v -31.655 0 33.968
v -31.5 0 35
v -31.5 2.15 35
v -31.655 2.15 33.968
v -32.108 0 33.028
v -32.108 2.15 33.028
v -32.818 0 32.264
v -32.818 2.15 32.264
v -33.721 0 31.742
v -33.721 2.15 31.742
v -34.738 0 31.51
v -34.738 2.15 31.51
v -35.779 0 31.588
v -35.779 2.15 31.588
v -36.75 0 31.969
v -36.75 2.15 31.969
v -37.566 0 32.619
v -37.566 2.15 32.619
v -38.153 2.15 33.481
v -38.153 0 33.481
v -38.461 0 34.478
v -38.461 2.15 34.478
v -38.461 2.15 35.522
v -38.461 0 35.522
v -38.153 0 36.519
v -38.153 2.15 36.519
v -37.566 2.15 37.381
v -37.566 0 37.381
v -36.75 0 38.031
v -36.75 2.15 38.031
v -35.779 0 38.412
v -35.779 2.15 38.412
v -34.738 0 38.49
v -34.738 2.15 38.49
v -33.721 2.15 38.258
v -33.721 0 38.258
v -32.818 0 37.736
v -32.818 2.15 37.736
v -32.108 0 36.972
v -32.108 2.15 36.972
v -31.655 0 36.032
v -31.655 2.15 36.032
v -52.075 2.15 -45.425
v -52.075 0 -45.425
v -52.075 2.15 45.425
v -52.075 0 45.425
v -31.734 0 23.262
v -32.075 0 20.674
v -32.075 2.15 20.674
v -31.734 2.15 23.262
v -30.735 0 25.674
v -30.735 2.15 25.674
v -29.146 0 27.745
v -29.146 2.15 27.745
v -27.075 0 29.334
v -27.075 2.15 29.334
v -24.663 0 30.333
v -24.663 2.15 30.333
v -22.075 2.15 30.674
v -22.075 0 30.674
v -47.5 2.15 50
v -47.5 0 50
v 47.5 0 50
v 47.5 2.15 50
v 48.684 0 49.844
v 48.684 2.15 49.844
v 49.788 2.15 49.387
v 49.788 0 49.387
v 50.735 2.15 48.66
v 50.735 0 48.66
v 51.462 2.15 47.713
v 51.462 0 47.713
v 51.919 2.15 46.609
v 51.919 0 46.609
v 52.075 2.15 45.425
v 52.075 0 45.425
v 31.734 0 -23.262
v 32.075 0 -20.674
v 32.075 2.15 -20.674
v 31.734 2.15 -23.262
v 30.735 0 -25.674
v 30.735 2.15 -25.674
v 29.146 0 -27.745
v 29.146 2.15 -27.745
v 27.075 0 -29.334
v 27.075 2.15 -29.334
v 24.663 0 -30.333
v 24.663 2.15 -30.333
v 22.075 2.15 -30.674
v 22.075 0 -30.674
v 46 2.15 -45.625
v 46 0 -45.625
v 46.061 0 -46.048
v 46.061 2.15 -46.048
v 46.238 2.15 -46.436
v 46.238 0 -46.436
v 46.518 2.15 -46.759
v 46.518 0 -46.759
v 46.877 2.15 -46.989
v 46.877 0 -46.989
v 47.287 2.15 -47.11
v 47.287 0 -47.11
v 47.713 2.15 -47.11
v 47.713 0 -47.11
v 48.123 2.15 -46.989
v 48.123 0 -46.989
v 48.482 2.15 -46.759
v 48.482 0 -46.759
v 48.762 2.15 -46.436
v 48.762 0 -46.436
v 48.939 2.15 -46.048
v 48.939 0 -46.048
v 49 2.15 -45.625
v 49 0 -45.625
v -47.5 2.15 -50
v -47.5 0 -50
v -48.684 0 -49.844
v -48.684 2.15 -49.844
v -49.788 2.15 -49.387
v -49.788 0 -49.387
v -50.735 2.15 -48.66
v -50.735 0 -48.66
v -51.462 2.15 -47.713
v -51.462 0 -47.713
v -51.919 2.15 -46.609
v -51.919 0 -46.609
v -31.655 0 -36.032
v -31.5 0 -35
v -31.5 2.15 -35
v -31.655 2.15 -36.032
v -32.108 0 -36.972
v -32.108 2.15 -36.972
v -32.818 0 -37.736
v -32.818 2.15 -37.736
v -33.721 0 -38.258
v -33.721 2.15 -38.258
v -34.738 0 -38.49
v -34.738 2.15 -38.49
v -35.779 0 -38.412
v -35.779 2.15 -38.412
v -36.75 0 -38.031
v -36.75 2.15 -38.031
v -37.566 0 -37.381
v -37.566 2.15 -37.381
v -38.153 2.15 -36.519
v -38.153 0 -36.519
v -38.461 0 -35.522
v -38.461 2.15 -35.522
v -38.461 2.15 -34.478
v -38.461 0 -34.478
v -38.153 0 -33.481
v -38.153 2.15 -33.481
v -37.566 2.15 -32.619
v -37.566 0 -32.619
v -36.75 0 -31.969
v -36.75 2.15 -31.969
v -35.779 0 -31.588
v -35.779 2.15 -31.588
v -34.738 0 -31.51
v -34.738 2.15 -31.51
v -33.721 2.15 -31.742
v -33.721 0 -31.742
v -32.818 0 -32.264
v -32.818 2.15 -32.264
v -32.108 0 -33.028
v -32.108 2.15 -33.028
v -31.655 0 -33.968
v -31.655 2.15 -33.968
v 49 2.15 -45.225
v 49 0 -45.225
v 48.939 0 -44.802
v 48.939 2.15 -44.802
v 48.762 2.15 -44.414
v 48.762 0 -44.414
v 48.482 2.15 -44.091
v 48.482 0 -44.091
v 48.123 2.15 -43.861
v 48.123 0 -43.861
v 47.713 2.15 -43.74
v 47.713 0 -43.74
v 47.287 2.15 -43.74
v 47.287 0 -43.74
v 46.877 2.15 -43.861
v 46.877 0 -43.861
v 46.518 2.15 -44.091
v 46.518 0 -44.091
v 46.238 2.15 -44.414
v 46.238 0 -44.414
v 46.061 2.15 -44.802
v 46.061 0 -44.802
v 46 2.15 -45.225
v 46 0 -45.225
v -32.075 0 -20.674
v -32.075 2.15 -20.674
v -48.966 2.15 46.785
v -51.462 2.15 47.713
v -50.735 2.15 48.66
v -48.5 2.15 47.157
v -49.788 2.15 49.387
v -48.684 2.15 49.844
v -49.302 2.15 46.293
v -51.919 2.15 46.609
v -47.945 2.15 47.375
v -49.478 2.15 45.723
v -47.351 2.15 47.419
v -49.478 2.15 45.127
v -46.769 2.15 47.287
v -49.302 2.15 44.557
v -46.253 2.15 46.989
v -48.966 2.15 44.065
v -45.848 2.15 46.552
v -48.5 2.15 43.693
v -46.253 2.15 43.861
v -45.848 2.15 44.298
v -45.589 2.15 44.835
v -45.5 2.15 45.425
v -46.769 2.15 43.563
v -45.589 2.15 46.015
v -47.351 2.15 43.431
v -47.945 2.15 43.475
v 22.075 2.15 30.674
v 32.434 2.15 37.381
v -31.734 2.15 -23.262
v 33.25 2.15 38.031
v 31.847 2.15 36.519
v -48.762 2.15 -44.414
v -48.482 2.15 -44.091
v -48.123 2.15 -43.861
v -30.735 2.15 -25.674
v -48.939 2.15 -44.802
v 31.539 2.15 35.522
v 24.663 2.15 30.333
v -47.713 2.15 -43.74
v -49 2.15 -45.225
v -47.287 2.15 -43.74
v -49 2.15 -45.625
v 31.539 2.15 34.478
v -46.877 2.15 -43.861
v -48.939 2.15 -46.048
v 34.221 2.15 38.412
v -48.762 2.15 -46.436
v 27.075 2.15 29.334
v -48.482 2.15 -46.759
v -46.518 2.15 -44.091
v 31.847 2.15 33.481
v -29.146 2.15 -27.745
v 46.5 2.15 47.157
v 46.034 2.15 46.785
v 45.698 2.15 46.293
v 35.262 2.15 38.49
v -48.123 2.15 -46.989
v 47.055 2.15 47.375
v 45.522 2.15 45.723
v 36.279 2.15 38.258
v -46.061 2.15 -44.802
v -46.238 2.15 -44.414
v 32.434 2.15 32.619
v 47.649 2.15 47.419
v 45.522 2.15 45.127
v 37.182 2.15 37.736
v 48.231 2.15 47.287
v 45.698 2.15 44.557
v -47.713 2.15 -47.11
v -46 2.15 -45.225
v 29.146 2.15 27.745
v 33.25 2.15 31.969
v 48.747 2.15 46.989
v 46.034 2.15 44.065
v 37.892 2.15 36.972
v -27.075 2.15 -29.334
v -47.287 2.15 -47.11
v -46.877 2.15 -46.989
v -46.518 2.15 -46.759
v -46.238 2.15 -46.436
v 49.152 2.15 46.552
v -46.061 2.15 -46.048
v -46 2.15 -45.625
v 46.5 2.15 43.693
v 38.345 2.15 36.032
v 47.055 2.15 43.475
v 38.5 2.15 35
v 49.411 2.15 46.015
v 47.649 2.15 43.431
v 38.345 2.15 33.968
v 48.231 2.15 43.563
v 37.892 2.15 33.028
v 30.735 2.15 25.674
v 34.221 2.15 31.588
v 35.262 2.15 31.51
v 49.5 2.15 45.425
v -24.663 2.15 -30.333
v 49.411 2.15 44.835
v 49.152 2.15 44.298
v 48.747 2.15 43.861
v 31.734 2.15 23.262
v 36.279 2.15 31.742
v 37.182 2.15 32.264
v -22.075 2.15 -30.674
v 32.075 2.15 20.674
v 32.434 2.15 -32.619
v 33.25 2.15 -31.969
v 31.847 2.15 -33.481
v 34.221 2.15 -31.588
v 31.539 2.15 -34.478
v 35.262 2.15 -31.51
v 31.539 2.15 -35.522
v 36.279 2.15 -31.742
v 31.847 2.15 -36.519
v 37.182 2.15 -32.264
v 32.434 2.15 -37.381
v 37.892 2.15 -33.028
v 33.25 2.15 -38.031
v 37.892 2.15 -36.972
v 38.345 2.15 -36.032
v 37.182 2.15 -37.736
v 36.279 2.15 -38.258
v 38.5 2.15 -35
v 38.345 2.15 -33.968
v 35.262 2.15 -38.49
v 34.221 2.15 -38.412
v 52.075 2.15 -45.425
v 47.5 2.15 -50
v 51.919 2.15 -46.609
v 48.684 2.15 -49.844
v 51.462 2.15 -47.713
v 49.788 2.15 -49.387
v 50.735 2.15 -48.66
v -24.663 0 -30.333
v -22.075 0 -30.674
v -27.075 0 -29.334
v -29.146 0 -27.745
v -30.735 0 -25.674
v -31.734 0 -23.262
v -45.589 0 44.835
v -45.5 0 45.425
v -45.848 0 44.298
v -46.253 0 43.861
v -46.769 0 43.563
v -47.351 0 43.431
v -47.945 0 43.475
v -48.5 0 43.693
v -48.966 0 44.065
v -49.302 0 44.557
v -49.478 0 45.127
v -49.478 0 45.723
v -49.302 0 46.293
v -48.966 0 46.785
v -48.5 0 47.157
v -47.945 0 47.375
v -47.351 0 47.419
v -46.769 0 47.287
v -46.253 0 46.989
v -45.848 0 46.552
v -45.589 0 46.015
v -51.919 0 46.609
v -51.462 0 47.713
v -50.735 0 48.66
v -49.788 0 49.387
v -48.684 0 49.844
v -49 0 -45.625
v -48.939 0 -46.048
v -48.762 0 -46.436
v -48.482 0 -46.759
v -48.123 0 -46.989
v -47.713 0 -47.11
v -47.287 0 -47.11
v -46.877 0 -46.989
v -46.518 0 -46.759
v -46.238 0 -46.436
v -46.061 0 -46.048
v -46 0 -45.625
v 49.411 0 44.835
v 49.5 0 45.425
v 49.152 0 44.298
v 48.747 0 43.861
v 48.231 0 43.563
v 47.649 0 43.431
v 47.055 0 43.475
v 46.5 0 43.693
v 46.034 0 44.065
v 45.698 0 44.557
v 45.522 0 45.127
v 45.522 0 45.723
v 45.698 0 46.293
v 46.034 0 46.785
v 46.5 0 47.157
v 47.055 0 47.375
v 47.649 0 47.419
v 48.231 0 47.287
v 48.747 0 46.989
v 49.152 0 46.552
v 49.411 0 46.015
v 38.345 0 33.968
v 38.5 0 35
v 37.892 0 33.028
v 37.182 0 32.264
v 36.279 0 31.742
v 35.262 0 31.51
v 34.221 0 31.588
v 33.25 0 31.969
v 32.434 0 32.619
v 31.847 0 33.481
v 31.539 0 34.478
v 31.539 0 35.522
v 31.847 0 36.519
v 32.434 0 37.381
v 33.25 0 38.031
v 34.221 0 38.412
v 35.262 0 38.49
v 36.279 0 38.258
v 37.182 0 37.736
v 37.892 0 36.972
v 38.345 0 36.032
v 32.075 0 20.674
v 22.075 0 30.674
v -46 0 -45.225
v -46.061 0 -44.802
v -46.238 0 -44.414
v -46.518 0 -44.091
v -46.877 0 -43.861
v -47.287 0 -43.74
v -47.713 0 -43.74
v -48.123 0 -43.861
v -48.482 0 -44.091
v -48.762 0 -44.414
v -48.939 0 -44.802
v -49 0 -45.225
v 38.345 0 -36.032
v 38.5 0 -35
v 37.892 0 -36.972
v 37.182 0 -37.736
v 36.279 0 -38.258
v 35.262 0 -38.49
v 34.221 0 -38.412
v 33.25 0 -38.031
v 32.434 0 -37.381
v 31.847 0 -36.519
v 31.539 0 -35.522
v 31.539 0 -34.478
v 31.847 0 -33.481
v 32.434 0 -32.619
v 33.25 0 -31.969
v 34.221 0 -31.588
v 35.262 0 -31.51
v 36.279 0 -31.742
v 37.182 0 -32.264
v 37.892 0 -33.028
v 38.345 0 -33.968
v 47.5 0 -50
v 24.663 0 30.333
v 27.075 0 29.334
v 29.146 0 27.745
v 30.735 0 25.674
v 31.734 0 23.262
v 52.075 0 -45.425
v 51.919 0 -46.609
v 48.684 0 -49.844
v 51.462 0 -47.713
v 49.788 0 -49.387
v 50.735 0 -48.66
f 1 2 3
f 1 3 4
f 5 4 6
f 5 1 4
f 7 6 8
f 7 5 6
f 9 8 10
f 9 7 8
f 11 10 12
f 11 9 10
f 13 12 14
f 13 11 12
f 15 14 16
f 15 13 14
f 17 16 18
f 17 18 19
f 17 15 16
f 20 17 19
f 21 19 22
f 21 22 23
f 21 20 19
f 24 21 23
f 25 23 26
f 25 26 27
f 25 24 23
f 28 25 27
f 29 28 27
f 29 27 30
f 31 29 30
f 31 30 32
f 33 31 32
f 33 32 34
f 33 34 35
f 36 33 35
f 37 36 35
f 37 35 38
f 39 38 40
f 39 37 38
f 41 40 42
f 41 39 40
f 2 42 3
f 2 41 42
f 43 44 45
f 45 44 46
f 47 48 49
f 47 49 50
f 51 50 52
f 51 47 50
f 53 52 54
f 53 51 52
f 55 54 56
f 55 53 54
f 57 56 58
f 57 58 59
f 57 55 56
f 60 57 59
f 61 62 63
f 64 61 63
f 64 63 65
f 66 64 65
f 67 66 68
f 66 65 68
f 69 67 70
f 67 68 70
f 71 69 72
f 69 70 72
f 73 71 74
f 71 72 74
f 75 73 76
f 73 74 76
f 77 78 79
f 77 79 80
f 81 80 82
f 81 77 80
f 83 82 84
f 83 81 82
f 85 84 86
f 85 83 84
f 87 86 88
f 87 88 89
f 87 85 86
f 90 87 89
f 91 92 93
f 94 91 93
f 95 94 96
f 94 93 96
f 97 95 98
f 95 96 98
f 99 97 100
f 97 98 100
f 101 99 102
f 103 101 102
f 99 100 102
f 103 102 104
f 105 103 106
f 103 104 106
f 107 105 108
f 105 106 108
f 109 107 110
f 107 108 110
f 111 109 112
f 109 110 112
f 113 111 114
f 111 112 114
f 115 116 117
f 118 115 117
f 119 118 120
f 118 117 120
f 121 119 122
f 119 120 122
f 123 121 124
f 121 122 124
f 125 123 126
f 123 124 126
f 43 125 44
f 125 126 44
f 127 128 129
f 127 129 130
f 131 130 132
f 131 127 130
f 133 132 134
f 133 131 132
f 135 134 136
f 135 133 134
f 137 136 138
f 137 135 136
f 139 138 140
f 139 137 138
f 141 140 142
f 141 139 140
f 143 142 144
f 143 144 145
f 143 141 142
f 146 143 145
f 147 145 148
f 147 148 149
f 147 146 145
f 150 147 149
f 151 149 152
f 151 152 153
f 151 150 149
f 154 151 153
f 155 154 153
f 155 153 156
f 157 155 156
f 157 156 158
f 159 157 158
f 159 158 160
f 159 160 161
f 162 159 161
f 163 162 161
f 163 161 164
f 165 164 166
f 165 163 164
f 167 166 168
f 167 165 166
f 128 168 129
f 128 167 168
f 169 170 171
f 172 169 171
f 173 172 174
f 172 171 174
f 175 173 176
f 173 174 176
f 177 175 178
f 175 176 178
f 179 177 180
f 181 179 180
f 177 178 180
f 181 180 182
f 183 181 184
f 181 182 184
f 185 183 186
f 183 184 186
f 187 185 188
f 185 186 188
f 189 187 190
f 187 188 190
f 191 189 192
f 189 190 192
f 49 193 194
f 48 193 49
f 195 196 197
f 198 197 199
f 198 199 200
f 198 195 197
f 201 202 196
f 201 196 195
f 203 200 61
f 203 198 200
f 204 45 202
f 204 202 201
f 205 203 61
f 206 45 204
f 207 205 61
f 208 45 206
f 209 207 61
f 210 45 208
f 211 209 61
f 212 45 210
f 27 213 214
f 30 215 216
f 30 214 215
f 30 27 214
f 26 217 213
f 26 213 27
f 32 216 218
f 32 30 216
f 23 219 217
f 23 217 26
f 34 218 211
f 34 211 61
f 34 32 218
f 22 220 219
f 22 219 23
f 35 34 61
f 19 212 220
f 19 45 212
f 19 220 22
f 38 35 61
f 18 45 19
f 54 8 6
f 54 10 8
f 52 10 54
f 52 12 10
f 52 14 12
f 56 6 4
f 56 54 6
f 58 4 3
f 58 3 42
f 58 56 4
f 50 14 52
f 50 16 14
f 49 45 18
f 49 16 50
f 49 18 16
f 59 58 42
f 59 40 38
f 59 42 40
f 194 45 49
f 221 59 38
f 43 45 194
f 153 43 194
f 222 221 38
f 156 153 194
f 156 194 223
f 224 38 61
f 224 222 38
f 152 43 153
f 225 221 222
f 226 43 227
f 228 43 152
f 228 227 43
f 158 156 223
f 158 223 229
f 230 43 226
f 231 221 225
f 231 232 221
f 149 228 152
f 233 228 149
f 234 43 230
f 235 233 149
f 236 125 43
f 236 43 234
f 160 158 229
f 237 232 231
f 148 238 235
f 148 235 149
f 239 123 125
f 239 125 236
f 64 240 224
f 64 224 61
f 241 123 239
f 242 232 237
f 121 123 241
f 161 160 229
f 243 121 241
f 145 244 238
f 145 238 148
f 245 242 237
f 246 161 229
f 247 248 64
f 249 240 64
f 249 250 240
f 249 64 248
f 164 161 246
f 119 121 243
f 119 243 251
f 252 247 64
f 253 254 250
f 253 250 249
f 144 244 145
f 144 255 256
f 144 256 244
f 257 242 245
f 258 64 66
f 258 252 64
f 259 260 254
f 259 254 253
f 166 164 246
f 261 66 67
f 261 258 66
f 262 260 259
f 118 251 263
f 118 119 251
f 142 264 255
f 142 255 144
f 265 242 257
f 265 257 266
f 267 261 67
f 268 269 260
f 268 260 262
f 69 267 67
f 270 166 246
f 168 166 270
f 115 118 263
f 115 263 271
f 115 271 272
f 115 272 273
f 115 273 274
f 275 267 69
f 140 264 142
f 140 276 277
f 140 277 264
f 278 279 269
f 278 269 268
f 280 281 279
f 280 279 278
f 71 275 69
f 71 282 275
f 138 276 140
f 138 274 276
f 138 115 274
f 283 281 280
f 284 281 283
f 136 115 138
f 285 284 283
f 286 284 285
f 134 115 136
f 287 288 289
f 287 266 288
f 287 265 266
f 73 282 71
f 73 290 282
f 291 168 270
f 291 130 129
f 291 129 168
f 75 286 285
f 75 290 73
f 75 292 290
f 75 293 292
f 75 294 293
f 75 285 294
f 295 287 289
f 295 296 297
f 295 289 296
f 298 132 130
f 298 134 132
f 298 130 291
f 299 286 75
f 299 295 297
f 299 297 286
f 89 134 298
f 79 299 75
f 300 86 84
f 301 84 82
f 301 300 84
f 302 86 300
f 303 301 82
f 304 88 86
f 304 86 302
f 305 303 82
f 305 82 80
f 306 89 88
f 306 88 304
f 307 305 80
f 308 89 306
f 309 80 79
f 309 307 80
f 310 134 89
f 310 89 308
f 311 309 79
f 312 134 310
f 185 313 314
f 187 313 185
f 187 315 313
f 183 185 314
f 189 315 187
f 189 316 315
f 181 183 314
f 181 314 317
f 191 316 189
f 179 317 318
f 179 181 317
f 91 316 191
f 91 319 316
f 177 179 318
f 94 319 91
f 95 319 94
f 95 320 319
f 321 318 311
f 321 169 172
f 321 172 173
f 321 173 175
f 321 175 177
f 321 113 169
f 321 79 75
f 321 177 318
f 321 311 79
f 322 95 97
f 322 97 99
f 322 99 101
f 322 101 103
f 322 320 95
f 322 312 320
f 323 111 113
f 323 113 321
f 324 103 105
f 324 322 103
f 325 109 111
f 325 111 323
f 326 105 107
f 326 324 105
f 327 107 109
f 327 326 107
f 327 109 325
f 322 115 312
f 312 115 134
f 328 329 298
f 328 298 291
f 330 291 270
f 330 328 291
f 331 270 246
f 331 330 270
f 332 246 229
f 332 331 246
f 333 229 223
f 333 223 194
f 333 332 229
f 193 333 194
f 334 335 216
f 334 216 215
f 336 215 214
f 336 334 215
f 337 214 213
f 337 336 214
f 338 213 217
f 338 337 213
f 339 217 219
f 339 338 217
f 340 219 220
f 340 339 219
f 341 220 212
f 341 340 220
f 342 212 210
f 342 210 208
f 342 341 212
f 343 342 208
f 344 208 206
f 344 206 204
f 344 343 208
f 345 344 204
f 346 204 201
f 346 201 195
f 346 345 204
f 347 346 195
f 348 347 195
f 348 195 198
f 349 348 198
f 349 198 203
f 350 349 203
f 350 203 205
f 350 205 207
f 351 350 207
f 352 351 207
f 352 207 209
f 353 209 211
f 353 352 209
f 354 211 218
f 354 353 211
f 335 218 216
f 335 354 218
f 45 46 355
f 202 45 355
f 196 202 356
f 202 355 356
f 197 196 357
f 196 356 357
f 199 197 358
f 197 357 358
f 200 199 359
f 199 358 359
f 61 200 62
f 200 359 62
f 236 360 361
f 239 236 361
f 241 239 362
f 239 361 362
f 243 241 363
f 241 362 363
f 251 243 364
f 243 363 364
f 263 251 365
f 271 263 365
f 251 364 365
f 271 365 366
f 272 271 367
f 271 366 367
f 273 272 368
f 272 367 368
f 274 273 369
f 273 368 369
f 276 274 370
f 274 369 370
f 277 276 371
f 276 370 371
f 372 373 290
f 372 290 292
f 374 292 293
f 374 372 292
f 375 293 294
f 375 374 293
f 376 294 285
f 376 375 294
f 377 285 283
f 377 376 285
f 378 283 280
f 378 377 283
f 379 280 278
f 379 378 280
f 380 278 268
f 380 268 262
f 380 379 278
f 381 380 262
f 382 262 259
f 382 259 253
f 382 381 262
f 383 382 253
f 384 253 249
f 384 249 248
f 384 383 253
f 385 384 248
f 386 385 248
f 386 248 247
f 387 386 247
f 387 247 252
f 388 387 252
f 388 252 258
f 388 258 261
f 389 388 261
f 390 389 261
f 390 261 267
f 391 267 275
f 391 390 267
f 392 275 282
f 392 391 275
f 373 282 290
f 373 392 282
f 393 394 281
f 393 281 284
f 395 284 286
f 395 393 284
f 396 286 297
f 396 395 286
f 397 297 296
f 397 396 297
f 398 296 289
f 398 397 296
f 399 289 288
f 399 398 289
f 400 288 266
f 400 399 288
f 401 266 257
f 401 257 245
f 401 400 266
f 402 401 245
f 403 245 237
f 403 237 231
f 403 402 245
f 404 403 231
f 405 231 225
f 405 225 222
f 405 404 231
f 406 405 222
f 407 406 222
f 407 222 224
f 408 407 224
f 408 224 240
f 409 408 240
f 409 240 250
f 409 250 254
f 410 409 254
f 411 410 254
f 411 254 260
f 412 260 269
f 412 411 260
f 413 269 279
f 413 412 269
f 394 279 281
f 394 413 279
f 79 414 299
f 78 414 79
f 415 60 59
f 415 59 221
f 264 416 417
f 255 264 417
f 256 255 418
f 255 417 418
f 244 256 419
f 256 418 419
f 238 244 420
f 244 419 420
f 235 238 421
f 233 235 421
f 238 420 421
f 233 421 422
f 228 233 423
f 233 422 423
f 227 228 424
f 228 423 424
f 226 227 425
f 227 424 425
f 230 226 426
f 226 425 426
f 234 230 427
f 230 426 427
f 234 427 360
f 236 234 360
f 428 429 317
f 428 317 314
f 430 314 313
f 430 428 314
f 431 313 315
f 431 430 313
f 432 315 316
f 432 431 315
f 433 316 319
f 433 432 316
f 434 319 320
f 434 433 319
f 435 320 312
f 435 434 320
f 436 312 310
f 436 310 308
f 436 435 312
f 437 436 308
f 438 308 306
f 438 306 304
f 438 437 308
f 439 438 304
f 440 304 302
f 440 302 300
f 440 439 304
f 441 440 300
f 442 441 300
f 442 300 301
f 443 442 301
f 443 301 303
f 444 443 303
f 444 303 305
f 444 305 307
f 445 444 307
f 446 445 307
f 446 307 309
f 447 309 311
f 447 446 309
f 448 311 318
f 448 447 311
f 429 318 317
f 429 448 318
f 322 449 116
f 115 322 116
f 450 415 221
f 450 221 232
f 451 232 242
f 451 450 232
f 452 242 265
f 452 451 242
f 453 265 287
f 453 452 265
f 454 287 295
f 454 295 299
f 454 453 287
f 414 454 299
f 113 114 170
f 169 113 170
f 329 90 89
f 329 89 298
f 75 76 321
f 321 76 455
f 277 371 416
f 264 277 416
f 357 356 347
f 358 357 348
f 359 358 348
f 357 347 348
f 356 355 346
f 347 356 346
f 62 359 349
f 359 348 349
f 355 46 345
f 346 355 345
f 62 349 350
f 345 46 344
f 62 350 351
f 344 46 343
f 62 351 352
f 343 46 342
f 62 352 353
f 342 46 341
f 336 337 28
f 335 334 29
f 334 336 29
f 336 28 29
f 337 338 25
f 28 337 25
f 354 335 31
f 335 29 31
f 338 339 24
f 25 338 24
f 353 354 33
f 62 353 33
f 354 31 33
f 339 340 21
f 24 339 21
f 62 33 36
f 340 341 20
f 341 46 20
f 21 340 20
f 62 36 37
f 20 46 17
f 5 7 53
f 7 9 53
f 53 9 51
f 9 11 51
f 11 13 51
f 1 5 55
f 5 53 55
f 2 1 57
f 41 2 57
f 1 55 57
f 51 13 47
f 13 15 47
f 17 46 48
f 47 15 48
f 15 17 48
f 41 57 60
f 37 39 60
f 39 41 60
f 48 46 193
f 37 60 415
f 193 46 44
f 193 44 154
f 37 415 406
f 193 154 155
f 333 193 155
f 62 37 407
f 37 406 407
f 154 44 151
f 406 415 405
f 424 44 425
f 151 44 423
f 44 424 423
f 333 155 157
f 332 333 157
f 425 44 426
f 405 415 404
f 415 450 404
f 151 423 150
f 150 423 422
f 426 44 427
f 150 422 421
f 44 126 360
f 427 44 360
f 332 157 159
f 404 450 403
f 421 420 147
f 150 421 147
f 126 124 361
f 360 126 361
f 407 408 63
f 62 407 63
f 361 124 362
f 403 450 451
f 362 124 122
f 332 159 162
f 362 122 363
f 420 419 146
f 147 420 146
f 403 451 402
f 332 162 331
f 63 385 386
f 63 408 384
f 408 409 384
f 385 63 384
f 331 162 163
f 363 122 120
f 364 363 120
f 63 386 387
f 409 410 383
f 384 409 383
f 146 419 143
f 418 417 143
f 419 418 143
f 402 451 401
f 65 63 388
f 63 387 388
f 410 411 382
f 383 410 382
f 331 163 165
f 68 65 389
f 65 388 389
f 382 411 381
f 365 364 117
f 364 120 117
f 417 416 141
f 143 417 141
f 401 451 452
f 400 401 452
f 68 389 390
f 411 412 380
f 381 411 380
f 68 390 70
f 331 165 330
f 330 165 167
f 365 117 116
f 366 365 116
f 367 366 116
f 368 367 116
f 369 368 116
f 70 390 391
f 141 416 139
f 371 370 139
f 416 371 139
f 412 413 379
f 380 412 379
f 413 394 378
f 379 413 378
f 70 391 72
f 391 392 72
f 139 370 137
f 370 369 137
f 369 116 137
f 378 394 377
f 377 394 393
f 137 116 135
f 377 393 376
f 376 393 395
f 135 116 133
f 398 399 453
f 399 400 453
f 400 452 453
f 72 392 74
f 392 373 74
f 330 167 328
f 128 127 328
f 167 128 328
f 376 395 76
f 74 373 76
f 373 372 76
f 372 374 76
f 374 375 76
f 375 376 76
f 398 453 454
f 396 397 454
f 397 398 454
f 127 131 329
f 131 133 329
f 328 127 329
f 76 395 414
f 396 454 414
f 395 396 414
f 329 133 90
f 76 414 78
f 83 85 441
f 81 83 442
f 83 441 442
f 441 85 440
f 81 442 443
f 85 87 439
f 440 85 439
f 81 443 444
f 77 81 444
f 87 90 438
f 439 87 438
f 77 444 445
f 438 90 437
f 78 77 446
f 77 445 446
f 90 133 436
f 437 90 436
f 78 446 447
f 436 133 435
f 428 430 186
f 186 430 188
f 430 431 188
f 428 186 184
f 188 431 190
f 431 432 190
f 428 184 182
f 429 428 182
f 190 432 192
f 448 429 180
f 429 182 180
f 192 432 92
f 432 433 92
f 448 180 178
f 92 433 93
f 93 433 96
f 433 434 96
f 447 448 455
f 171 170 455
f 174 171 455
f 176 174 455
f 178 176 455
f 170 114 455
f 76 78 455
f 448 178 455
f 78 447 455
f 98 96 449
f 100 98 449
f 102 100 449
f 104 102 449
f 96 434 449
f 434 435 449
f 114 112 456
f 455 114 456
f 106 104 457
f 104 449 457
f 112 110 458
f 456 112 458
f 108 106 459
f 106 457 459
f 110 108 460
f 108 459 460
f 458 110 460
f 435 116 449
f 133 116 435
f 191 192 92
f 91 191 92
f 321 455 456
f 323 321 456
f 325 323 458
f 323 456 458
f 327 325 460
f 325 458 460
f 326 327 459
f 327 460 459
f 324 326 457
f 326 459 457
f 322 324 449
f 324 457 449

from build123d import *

# Parameters (mm, degrees)
SKETCH2_R           = 2
SKETCH2_R_2         = 3.5
BOSS_EXTRUDE1_DEPTH = 2.15


with BuildPart() as part:
    # Sketch2 → Boss-Extrude1 (new body)
    with BuildSketch(Plane(origin=(0, 0, 0), x_dir=(1, 0, 0), z_dir=(0, 1, 0))):
        with BuildLine():
            Line((-52.075, 45.425), (-52.075, -45.425))
            ThreePointArc((-52.075, -45.425), (-50.735013524, -48.660013524), (-47.5, -50))
            Line((-47.5, -50), (47.5, -50))
            ThreePointArc((47.5, -50), (50.735013524, -48.660013524), (52.075, -45.425))
            Line((52.075, -45.425), (52.075, 45.425))
            ThreePointArc((52.075, 45.425), (50.735013524, 48.660013524), (47.5, 50))
            Line((47.5, 50), (-47.5, 50))
            ThreePointArc((-47.5, 50), (-50.735013524, 48.660013524), (-52.075, 45.425))
        make_face()
        with Locations((47.5, -45.425)):
            Circle(SKETCH2_R, mode=Mode.SUBTRACT)
        with Locations((-47.5, -45.425)):
            Circle(SKETCH2_R, mode=Mode.SUBTRACT)
        with Locations((-35, 35)):
            Circle(SKETCH2_R_2, mode=Mode.SUBTRACT)
        with Locations((35, 35)):
            Circle(SKETCH2_R_2, mode=Mode.SUBTRACT)
        with Locations((35, -35)):
            Circle(SKETCH2_R_2, mode=Mode.SUBTRACT)
        with Locations((-35, -35)):
            Circle(SKETCH2_R_2, mode=Mode.SUBTRACT)
        with BuildLine():
            Line((-49, 45.225), (-49, 45.625))
            ThreePointArc((-49, 45.625), (-47.5, 47.125), (-46, 45.625))
            Line((-46, 45.625), (-46, 45.225))
            ThreePointArc((-46, 45.225), (-47.5, 43.725), (-49, 45.225))
        make_face(mode=Mode.SUBTRACT)
        with BuildLine():
            Line((46, 45.225), (46, 45.625))
            ThreePointArc((46, 45.625), (47.5, 47.125), (49, 45.625))
            Line((49, 45.625), (49, 45.225))
            ThreePointArc((49, 45.225), (47.5, 43.725), (46, 45.225))
        make_face(mode=Mode.SUBTRACT)
        with BuildLine():
            Line((-22.075, -30.673828947), (22.075, -30.673828947))
            ThreePointArc((22.075, -30.673828947), (29.146067812, -27.744896759), (32.075, -20.673828947))
            Line((32.075, -20.673828947), (32.075, 20.673828947))
            ThreePointArc((32.075, 20.673828947), (29.146067812, 27.744896759), (22.075, 30.673828947))
            Line((22.075, 30.673828947), (-22.075, 30.673828947))
            ThreePointArc((-22.075, 30.673828947), (-29.146067812, 27.744896759), (-32.075, 20.673828947))
            Line((-32.075, 20.673828947), (-32.075, -20.673828947))
            ThreePointArc((-32.075, -20.673828947), (-29.146067812, -27.744896759), (-22.075, -30.673828947))
        make_face(mode=Mode.SUBTRACT)
    extrude(amount=BOSS_EXTRUDE1_DEPTH)


solid = part.part
